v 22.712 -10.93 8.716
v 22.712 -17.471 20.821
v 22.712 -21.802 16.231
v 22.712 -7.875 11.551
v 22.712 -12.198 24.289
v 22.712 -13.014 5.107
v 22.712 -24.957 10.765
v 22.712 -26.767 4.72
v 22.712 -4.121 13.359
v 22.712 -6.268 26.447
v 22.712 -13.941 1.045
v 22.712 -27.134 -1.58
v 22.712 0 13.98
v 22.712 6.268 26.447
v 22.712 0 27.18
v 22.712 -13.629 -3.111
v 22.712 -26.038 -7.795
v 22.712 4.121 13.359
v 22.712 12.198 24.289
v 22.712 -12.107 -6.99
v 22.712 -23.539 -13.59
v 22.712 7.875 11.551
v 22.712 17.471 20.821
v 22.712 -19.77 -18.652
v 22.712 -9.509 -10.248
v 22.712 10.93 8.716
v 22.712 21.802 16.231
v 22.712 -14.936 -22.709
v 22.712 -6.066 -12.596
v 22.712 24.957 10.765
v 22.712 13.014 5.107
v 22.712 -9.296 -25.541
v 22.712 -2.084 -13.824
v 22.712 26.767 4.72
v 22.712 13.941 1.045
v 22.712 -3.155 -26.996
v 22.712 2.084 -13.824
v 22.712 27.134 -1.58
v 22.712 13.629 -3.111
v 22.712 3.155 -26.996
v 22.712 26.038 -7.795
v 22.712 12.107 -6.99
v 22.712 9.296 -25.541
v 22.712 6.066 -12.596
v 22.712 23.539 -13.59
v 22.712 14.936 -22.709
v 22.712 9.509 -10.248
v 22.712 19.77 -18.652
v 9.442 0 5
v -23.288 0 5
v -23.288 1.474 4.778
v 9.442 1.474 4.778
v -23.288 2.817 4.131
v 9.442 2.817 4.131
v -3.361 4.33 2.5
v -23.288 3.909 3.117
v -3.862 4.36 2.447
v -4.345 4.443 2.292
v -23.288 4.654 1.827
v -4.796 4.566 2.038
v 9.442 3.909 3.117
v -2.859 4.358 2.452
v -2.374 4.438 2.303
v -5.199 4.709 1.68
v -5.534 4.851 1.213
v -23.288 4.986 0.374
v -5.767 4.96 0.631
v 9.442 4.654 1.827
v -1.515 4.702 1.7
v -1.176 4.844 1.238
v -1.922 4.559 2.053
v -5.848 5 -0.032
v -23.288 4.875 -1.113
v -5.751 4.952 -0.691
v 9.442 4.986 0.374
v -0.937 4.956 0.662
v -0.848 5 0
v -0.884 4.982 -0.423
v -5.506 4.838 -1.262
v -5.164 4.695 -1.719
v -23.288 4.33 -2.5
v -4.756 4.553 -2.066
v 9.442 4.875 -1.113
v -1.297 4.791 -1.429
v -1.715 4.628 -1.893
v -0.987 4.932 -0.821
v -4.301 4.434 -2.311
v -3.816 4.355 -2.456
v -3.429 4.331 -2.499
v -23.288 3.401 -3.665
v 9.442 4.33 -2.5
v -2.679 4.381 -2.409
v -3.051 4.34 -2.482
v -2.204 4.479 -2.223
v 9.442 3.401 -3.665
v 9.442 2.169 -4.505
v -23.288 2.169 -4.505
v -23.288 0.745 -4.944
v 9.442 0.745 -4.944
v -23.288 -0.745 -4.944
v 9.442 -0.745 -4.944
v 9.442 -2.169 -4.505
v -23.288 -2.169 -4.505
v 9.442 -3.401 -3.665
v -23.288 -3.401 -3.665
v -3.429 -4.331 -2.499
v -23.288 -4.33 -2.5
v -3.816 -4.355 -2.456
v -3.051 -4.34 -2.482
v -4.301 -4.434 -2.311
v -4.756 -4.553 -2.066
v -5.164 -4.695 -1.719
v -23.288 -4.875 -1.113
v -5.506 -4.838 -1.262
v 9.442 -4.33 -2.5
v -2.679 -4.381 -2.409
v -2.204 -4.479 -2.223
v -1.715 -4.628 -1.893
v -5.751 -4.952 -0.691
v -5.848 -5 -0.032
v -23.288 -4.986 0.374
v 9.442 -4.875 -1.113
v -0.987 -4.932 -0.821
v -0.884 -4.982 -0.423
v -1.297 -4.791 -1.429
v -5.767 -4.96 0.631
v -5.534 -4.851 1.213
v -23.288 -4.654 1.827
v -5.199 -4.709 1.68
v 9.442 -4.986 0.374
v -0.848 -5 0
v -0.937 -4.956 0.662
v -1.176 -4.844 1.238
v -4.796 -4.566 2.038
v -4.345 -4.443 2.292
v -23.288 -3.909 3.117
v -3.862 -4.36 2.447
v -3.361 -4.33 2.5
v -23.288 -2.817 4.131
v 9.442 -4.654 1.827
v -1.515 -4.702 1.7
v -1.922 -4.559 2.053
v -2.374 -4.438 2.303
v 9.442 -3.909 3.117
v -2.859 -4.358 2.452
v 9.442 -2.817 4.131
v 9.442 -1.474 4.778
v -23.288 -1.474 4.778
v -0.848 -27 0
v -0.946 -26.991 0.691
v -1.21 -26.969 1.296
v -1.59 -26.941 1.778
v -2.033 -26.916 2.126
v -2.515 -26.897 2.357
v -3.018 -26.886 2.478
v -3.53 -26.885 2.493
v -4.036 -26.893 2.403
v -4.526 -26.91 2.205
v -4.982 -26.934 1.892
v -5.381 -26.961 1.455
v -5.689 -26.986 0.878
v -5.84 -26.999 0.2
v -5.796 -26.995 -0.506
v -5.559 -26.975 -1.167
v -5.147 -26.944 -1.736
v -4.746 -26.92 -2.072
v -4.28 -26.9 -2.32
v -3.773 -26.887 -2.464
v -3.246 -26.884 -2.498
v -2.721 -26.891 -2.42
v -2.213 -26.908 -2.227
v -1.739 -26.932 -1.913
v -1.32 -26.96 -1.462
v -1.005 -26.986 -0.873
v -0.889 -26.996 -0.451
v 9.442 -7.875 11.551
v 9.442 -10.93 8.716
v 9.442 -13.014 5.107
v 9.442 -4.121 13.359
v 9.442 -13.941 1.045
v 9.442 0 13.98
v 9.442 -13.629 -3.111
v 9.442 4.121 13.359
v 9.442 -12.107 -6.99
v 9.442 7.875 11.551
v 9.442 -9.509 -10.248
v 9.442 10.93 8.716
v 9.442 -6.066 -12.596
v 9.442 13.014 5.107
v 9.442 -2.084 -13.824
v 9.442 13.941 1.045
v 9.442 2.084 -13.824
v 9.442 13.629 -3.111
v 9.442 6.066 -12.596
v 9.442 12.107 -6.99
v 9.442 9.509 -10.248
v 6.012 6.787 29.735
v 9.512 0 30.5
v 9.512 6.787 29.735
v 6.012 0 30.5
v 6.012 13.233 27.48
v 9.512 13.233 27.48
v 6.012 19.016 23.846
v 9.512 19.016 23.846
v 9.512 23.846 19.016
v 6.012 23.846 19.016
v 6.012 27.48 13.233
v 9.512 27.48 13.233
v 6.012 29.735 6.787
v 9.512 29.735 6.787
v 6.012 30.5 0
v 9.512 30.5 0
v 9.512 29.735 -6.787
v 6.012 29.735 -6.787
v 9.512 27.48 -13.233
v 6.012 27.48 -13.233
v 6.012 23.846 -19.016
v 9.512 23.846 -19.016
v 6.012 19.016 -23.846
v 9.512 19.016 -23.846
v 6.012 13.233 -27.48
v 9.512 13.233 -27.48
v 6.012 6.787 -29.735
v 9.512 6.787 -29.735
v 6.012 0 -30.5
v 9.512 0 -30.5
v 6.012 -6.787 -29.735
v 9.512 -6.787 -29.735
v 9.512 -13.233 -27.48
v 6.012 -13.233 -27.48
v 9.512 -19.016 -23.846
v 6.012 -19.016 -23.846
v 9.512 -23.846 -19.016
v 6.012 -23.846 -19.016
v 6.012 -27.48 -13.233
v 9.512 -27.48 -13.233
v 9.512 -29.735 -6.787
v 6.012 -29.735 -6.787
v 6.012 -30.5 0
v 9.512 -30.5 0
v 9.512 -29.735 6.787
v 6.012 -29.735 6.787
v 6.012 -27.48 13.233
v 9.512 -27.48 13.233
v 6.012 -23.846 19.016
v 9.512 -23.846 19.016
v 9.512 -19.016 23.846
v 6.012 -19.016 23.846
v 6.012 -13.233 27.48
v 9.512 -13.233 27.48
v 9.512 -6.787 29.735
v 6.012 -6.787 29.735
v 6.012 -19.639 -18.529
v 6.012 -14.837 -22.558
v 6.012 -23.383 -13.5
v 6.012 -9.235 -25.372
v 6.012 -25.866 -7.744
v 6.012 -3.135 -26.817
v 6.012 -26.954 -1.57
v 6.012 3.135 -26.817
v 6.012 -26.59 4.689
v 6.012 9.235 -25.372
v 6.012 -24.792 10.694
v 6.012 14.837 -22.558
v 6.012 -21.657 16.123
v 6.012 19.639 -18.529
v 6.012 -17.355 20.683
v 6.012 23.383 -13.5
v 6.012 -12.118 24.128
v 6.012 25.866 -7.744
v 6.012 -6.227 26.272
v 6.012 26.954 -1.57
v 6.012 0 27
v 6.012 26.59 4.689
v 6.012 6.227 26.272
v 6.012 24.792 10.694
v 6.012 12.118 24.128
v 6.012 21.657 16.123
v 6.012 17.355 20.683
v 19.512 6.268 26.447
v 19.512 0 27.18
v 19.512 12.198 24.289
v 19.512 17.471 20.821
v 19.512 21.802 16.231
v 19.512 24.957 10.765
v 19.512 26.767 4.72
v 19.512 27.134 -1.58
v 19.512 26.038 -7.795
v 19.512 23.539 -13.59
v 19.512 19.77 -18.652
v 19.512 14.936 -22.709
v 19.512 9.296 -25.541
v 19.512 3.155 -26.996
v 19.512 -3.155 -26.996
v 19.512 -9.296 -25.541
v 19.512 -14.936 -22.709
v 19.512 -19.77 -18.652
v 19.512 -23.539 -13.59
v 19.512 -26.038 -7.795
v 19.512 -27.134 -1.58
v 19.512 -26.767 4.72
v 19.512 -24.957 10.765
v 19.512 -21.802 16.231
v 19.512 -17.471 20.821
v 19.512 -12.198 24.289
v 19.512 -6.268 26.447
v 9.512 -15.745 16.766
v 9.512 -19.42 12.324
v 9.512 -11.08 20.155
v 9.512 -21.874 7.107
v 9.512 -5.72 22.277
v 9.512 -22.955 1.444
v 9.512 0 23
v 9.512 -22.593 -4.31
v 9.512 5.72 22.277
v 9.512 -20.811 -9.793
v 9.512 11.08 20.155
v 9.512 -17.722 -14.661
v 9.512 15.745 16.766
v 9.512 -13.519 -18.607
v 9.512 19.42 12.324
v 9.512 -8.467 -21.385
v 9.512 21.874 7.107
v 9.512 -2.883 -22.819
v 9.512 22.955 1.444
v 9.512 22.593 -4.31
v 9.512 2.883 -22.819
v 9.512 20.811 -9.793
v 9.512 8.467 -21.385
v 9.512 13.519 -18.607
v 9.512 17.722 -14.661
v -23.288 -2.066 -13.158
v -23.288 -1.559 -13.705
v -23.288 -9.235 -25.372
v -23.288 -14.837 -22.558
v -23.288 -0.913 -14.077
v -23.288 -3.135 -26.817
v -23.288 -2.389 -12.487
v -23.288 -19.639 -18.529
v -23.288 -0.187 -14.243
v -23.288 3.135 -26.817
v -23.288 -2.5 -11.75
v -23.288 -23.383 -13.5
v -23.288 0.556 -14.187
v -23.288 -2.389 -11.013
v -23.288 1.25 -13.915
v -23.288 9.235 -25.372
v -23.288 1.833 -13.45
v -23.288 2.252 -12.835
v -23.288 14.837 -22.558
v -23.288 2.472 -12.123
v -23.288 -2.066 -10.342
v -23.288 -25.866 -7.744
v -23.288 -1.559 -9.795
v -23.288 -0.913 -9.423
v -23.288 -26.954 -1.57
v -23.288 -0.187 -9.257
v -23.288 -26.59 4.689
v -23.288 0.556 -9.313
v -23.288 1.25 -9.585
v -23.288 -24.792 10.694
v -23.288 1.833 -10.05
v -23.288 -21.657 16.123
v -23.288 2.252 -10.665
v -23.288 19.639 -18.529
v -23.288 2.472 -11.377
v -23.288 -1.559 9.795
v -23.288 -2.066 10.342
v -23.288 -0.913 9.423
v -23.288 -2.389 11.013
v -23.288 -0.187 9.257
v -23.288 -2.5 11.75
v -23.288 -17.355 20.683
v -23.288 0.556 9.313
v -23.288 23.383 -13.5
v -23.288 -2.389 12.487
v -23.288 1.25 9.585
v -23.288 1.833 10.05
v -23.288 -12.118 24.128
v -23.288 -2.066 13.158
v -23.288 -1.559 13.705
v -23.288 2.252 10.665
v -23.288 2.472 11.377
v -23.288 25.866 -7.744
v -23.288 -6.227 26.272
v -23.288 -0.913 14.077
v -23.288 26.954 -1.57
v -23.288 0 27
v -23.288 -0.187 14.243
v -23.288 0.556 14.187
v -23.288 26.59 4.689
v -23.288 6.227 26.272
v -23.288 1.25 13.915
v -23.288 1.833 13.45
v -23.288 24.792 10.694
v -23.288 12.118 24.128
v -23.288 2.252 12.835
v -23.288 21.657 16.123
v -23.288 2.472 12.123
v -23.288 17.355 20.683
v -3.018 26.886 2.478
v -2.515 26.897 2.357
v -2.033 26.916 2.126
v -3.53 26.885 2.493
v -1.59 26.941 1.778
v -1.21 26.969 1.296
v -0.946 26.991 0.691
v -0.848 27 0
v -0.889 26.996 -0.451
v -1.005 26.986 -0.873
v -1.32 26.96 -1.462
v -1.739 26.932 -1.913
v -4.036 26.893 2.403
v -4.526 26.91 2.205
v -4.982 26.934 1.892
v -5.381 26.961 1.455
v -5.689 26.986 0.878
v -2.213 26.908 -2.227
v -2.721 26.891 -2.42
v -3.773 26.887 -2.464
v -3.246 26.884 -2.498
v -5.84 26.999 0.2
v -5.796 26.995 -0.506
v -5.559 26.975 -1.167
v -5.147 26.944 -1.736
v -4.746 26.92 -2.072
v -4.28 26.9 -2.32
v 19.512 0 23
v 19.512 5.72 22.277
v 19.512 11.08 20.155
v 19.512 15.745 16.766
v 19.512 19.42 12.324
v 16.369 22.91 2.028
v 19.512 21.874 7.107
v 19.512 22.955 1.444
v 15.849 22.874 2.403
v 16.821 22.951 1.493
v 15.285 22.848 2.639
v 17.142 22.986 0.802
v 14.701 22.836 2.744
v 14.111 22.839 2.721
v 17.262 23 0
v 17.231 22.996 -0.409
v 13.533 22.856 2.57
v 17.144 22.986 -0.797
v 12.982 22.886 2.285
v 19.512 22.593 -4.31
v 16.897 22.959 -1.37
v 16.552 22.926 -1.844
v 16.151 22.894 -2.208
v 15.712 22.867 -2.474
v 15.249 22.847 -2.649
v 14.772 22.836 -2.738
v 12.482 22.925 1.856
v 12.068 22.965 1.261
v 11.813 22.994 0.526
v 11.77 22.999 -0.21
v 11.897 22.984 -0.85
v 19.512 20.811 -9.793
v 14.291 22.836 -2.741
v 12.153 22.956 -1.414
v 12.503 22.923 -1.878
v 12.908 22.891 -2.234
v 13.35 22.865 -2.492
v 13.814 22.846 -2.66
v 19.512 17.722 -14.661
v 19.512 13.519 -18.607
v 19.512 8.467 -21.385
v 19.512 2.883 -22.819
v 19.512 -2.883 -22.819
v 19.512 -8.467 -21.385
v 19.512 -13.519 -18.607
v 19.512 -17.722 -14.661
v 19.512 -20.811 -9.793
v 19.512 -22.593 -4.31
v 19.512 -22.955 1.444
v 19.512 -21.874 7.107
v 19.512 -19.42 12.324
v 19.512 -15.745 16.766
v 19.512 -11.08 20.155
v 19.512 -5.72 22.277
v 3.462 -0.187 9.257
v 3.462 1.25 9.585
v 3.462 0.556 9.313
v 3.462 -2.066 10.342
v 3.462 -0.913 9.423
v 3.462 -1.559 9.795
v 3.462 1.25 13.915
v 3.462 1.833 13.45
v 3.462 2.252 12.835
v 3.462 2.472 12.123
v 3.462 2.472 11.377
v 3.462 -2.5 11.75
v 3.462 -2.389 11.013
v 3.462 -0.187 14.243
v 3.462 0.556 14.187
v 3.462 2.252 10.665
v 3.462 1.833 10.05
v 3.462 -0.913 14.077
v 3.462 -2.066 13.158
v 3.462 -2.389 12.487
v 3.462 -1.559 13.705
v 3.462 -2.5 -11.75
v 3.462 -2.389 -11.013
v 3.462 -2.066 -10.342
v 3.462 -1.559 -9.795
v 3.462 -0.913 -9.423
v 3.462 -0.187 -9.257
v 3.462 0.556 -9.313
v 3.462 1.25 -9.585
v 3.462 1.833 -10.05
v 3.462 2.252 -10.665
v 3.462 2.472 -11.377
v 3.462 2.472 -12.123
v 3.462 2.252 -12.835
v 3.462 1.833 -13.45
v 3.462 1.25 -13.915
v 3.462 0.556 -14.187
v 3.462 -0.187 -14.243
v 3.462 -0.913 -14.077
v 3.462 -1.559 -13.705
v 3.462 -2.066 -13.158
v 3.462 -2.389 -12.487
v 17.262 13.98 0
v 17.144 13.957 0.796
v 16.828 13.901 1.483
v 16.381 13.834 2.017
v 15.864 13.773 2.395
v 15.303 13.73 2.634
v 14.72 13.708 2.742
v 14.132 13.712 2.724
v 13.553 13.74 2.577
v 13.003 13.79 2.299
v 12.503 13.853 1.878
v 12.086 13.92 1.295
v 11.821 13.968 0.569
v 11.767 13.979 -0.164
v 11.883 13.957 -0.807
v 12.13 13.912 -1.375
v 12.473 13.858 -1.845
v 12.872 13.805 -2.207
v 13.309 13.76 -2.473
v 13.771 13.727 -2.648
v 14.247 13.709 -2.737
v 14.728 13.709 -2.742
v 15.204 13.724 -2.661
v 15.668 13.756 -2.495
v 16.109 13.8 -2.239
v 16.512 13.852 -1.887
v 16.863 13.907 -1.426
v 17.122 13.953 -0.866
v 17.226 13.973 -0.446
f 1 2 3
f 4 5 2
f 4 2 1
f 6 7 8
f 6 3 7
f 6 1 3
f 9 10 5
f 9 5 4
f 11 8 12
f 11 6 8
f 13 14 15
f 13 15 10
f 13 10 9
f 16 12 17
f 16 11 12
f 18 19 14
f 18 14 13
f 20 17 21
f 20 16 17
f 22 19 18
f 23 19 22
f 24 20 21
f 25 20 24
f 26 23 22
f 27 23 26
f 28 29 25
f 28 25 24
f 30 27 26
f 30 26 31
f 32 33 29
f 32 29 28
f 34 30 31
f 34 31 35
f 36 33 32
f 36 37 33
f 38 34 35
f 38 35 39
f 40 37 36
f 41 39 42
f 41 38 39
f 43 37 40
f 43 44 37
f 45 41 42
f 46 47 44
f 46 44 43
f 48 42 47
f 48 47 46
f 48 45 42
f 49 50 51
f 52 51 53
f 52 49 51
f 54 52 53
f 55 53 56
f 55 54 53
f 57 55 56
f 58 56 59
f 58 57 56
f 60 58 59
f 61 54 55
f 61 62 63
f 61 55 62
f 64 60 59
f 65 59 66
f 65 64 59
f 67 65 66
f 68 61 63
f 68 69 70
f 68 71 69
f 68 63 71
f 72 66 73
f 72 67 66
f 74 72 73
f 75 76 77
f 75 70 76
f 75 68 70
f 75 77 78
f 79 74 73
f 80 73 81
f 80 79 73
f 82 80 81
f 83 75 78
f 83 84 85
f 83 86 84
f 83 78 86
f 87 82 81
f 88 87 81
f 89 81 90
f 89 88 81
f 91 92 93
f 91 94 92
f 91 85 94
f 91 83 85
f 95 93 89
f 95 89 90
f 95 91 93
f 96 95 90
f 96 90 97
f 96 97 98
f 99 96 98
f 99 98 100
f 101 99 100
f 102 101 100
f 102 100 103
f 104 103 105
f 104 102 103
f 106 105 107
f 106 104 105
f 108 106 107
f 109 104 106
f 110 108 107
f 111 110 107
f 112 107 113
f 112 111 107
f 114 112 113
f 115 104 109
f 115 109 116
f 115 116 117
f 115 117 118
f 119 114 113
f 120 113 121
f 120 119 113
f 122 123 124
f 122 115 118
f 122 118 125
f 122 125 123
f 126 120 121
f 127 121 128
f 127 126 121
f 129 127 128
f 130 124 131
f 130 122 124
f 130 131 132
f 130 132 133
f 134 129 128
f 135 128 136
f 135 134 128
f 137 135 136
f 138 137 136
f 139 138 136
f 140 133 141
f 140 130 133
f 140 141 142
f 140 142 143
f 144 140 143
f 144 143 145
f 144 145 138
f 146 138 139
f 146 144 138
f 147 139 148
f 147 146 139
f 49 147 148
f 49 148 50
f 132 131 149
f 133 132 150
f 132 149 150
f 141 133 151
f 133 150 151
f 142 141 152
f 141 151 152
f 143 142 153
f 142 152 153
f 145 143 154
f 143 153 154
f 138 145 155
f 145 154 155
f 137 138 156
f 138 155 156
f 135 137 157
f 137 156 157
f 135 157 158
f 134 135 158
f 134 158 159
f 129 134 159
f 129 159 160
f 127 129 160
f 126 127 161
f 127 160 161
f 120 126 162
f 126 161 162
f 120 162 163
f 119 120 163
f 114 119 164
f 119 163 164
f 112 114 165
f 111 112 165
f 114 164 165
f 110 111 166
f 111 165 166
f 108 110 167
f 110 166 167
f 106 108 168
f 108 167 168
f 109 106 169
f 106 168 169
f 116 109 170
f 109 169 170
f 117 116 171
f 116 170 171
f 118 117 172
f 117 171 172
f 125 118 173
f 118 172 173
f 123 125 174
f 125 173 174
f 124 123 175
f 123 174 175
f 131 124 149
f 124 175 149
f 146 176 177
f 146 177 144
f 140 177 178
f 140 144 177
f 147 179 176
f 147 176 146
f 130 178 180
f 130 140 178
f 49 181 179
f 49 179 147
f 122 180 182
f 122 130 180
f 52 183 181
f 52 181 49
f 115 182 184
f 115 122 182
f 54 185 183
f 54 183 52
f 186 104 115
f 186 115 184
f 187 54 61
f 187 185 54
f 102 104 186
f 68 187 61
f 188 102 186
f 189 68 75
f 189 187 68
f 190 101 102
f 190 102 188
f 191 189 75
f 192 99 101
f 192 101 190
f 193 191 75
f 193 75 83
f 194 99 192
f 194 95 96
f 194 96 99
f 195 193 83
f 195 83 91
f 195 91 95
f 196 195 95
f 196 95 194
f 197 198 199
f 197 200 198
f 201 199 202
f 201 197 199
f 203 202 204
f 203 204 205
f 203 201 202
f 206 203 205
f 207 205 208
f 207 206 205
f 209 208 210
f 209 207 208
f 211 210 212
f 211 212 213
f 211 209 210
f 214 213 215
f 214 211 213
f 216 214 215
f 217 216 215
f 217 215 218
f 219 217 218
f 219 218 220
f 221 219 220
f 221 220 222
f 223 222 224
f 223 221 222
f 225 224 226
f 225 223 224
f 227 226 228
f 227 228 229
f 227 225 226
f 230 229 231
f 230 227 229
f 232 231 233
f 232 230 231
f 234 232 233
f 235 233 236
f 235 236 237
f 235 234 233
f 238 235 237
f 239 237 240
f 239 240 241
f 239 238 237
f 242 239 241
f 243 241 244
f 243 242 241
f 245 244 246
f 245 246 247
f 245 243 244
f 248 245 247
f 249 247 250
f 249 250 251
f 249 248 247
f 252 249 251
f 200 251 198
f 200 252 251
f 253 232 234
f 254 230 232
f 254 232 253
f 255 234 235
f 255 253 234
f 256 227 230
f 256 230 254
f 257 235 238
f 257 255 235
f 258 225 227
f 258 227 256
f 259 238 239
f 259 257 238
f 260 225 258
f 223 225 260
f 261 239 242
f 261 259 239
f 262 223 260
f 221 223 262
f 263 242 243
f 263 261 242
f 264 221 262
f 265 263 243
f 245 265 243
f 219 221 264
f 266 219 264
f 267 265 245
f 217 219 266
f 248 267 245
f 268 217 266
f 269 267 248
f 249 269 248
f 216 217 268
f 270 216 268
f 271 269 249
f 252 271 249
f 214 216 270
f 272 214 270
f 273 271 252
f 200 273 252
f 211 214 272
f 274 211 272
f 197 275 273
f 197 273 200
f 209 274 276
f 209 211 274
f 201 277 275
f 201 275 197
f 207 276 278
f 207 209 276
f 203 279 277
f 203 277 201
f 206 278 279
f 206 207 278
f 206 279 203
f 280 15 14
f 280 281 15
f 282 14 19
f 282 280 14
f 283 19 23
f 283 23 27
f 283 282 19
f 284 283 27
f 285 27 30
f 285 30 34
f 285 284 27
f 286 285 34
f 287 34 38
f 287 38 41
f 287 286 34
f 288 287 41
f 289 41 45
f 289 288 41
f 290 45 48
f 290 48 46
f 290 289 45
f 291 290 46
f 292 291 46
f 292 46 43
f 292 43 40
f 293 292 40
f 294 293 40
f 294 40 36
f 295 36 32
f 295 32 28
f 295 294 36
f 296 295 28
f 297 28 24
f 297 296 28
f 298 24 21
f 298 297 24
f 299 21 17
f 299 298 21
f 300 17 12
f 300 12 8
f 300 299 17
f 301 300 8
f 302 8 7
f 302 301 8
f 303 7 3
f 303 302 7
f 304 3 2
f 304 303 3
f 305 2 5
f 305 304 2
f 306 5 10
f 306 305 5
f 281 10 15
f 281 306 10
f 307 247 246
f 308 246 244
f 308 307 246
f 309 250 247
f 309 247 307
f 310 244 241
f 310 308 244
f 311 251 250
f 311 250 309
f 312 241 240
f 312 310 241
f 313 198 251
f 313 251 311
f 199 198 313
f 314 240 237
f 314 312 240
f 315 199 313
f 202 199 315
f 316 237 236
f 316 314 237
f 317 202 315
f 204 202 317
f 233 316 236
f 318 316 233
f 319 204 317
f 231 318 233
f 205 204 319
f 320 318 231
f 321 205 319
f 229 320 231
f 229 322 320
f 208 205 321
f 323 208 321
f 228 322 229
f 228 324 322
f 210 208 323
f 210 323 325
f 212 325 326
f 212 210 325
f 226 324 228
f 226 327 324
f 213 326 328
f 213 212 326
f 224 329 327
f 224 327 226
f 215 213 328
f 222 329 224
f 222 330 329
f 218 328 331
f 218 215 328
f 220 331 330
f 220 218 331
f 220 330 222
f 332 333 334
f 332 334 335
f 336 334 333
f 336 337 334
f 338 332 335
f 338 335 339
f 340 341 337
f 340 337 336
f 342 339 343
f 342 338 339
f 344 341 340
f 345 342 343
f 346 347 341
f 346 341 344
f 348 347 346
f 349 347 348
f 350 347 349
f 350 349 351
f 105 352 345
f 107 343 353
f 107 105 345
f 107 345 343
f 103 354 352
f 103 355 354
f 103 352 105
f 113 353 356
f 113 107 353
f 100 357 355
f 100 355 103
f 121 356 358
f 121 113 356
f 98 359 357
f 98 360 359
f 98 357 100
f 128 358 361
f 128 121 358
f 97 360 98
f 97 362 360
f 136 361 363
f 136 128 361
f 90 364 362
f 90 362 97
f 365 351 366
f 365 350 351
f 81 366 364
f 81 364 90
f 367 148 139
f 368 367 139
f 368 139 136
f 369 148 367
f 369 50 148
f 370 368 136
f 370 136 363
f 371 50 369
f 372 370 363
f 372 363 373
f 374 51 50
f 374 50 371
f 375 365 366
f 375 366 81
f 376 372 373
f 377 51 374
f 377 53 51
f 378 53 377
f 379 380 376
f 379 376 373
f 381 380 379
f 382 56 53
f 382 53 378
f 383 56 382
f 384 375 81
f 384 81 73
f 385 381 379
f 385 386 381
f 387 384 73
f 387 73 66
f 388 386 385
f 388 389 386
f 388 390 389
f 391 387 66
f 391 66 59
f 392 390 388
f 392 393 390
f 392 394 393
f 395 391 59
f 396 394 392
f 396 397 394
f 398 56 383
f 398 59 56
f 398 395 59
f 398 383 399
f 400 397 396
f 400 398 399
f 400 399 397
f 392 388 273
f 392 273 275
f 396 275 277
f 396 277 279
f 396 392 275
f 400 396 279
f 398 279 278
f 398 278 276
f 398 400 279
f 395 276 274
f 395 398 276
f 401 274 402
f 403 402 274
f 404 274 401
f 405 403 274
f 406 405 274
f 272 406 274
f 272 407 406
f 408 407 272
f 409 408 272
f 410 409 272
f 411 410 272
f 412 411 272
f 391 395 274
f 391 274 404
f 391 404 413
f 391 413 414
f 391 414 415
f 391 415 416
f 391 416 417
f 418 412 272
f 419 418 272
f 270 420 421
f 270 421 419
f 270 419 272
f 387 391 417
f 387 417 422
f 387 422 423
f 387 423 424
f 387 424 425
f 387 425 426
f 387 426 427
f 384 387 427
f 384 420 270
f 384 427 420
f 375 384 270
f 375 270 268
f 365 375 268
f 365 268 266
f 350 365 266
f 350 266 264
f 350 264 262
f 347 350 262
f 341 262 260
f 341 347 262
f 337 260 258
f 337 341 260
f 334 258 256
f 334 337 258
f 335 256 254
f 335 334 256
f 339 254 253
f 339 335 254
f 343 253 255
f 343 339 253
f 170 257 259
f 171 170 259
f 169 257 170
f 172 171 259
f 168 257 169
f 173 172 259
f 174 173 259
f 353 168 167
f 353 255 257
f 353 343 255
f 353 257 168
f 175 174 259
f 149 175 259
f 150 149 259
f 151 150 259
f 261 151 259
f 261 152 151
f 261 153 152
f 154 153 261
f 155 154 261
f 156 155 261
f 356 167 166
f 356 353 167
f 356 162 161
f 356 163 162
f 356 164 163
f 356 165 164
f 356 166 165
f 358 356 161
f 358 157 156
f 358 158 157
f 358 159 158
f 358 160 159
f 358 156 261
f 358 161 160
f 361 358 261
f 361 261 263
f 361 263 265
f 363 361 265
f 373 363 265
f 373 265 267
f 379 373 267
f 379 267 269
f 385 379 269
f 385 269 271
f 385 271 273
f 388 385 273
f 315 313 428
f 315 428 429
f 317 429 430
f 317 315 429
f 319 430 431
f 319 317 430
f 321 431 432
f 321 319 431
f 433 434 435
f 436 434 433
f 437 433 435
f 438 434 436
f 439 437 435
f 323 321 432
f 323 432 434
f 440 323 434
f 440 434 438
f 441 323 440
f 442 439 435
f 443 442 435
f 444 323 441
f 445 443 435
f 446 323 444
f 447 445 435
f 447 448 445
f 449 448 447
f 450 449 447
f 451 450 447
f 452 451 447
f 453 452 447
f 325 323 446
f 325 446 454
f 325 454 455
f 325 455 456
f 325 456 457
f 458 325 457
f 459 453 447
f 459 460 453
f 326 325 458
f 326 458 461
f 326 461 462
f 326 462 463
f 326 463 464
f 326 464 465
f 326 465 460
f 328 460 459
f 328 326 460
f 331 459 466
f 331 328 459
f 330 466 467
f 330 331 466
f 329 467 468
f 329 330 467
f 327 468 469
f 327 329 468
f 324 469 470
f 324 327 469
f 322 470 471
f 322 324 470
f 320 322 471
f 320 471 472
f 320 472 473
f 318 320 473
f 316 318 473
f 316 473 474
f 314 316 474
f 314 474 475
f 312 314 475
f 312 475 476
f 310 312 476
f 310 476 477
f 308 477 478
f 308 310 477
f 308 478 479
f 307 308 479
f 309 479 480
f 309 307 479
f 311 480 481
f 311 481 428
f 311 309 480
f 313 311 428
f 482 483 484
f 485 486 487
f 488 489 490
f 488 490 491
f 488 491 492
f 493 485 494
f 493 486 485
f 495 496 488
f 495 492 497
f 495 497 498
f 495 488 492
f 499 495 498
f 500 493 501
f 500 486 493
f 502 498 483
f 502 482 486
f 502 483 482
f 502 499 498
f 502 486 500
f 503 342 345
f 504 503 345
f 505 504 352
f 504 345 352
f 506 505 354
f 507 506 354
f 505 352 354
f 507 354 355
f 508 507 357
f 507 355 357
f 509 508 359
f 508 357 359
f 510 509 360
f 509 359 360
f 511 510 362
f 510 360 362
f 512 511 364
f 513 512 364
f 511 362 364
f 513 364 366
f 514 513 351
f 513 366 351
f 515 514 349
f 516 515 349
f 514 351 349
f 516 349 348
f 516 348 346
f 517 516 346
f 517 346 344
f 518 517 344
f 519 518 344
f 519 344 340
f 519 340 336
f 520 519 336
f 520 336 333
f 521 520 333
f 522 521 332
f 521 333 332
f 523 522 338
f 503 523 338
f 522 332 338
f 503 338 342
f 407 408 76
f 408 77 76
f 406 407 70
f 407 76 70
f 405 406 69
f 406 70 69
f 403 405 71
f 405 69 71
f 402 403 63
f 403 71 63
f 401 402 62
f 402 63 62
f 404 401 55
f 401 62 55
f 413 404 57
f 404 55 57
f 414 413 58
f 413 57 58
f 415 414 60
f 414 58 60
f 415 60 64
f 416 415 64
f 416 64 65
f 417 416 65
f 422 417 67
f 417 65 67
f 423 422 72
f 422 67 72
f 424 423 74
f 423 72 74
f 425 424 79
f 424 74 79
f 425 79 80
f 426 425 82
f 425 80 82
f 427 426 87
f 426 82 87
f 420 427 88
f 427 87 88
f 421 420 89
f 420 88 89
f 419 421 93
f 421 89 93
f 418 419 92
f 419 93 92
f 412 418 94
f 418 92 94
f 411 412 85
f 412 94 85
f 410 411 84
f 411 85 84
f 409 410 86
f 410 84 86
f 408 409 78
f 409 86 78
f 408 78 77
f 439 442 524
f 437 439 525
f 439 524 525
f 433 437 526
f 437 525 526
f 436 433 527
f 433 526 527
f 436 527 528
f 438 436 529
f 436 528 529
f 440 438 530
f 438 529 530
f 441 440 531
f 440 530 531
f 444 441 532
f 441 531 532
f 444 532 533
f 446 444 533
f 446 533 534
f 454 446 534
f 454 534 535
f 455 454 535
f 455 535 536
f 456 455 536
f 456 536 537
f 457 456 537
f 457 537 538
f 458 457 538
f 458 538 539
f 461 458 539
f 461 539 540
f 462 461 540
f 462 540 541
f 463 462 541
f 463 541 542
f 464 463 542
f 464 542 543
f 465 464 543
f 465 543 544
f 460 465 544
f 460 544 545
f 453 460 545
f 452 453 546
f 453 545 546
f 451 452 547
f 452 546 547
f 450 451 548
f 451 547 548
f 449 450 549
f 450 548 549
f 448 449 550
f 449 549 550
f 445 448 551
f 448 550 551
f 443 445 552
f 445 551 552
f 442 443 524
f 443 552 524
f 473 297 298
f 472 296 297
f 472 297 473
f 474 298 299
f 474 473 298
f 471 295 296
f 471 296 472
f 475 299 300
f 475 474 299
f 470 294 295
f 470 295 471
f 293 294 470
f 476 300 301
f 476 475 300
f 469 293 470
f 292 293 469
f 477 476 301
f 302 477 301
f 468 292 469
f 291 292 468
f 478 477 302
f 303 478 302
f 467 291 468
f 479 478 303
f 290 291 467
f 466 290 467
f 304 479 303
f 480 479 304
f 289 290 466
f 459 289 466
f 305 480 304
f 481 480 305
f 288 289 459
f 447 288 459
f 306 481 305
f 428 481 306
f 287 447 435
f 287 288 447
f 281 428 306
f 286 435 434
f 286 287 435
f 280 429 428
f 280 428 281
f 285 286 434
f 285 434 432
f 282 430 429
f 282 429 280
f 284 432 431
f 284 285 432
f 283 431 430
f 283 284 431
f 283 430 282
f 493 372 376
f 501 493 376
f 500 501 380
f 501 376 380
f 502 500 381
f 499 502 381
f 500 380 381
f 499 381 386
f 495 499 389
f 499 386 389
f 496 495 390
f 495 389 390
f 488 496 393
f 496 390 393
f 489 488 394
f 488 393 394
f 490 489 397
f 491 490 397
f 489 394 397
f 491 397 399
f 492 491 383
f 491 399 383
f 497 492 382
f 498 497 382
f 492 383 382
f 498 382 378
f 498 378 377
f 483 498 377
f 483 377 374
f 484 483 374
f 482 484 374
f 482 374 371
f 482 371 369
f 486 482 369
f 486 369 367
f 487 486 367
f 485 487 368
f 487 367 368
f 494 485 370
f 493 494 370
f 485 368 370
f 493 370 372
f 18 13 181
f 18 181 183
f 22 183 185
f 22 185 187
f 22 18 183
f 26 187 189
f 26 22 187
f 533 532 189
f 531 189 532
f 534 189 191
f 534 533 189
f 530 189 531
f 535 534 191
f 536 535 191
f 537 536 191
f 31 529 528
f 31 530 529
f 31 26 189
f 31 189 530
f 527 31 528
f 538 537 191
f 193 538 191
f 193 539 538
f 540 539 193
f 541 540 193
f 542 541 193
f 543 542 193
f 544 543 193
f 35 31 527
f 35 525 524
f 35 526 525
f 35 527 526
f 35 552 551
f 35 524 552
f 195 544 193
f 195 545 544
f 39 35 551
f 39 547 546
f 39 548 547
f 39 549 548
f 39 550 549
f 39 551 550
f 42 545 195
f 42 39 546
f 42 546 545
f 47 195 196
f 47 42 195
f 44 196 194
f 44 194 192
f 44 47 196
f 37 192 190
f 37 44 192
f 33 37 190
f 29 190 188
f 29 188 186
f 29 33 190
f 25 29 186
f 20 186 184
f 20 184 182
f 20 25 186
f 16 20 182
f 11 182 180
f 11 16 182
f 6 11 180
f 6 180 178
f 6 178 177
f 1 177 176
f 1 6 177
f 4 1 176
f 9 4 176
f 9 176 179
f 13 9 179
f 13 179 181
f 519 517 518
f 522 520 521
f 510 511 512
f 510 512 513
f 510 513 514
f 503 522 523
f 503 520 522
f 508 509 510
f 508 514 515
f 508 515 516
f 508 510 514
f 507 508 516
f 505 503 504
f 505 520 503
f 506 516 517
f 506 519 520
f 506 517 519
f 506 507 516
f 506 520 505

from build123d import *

# Parameters (mm, degrees)
F3_R     = 2.5
F4_DEPTH = 56.9
F5_R     = 2.5
F6_DEPTH = 26.75
F7_R     = 2.75
F8_DEPTH = 25


with BuildPart() as f2:
    # F0 (on Front) → F2 (revolve)
    with BuildSketch(Plane.XZ):
        Polygon((6.011957, 27), (-23.288043, 27), (-23.288043, 5), (9.441957, 5), (9.441957, 13.98), (22.711957, 13.98), (22.711957, 27.18), (19.511957, 27.18), (19.511957, 23), (9.511957, 23), (9.511957, 30.5), (6.011957, 30.5), align=None)
    revolve(axis=Axis((-13.926744, 0, 0), (-1, 0, 0)))

    # F3 (on Front) → F4 (cut, symmetric)
    with BuildSketch(Plane.XZ):
        with Locations((-3.348043, 0)):
            Circle(F3_R)
    extrude(amount=F4_DEPTH, both=True, mode=Mode.SUBTRACT)

    # F5 (on face) → F6 (cut)
    with BuildSketch(Plane(origin=(-23.288043, 0, 0), x_dir=(0, -1, 0), z_dir=(-1, 0, 0))):
        with Locations((0, -11.75)):
            Circle(F5_R)
        with Locations((0, 11.75)):
            Circle(F5_R)
    extrude(amount=-F6_DEPTH, mode=Mode.SUBTRACT)

    # F7 (on Front) → F8 (cut)
    with BuildSketch(Plane.XZ):
        with Locations((14.511957, 0)):
            Circle(F7_R)
    extrude(amount=-F8_DEPTH, mode=Mode.SUBTRACT)


solid = f2.part
